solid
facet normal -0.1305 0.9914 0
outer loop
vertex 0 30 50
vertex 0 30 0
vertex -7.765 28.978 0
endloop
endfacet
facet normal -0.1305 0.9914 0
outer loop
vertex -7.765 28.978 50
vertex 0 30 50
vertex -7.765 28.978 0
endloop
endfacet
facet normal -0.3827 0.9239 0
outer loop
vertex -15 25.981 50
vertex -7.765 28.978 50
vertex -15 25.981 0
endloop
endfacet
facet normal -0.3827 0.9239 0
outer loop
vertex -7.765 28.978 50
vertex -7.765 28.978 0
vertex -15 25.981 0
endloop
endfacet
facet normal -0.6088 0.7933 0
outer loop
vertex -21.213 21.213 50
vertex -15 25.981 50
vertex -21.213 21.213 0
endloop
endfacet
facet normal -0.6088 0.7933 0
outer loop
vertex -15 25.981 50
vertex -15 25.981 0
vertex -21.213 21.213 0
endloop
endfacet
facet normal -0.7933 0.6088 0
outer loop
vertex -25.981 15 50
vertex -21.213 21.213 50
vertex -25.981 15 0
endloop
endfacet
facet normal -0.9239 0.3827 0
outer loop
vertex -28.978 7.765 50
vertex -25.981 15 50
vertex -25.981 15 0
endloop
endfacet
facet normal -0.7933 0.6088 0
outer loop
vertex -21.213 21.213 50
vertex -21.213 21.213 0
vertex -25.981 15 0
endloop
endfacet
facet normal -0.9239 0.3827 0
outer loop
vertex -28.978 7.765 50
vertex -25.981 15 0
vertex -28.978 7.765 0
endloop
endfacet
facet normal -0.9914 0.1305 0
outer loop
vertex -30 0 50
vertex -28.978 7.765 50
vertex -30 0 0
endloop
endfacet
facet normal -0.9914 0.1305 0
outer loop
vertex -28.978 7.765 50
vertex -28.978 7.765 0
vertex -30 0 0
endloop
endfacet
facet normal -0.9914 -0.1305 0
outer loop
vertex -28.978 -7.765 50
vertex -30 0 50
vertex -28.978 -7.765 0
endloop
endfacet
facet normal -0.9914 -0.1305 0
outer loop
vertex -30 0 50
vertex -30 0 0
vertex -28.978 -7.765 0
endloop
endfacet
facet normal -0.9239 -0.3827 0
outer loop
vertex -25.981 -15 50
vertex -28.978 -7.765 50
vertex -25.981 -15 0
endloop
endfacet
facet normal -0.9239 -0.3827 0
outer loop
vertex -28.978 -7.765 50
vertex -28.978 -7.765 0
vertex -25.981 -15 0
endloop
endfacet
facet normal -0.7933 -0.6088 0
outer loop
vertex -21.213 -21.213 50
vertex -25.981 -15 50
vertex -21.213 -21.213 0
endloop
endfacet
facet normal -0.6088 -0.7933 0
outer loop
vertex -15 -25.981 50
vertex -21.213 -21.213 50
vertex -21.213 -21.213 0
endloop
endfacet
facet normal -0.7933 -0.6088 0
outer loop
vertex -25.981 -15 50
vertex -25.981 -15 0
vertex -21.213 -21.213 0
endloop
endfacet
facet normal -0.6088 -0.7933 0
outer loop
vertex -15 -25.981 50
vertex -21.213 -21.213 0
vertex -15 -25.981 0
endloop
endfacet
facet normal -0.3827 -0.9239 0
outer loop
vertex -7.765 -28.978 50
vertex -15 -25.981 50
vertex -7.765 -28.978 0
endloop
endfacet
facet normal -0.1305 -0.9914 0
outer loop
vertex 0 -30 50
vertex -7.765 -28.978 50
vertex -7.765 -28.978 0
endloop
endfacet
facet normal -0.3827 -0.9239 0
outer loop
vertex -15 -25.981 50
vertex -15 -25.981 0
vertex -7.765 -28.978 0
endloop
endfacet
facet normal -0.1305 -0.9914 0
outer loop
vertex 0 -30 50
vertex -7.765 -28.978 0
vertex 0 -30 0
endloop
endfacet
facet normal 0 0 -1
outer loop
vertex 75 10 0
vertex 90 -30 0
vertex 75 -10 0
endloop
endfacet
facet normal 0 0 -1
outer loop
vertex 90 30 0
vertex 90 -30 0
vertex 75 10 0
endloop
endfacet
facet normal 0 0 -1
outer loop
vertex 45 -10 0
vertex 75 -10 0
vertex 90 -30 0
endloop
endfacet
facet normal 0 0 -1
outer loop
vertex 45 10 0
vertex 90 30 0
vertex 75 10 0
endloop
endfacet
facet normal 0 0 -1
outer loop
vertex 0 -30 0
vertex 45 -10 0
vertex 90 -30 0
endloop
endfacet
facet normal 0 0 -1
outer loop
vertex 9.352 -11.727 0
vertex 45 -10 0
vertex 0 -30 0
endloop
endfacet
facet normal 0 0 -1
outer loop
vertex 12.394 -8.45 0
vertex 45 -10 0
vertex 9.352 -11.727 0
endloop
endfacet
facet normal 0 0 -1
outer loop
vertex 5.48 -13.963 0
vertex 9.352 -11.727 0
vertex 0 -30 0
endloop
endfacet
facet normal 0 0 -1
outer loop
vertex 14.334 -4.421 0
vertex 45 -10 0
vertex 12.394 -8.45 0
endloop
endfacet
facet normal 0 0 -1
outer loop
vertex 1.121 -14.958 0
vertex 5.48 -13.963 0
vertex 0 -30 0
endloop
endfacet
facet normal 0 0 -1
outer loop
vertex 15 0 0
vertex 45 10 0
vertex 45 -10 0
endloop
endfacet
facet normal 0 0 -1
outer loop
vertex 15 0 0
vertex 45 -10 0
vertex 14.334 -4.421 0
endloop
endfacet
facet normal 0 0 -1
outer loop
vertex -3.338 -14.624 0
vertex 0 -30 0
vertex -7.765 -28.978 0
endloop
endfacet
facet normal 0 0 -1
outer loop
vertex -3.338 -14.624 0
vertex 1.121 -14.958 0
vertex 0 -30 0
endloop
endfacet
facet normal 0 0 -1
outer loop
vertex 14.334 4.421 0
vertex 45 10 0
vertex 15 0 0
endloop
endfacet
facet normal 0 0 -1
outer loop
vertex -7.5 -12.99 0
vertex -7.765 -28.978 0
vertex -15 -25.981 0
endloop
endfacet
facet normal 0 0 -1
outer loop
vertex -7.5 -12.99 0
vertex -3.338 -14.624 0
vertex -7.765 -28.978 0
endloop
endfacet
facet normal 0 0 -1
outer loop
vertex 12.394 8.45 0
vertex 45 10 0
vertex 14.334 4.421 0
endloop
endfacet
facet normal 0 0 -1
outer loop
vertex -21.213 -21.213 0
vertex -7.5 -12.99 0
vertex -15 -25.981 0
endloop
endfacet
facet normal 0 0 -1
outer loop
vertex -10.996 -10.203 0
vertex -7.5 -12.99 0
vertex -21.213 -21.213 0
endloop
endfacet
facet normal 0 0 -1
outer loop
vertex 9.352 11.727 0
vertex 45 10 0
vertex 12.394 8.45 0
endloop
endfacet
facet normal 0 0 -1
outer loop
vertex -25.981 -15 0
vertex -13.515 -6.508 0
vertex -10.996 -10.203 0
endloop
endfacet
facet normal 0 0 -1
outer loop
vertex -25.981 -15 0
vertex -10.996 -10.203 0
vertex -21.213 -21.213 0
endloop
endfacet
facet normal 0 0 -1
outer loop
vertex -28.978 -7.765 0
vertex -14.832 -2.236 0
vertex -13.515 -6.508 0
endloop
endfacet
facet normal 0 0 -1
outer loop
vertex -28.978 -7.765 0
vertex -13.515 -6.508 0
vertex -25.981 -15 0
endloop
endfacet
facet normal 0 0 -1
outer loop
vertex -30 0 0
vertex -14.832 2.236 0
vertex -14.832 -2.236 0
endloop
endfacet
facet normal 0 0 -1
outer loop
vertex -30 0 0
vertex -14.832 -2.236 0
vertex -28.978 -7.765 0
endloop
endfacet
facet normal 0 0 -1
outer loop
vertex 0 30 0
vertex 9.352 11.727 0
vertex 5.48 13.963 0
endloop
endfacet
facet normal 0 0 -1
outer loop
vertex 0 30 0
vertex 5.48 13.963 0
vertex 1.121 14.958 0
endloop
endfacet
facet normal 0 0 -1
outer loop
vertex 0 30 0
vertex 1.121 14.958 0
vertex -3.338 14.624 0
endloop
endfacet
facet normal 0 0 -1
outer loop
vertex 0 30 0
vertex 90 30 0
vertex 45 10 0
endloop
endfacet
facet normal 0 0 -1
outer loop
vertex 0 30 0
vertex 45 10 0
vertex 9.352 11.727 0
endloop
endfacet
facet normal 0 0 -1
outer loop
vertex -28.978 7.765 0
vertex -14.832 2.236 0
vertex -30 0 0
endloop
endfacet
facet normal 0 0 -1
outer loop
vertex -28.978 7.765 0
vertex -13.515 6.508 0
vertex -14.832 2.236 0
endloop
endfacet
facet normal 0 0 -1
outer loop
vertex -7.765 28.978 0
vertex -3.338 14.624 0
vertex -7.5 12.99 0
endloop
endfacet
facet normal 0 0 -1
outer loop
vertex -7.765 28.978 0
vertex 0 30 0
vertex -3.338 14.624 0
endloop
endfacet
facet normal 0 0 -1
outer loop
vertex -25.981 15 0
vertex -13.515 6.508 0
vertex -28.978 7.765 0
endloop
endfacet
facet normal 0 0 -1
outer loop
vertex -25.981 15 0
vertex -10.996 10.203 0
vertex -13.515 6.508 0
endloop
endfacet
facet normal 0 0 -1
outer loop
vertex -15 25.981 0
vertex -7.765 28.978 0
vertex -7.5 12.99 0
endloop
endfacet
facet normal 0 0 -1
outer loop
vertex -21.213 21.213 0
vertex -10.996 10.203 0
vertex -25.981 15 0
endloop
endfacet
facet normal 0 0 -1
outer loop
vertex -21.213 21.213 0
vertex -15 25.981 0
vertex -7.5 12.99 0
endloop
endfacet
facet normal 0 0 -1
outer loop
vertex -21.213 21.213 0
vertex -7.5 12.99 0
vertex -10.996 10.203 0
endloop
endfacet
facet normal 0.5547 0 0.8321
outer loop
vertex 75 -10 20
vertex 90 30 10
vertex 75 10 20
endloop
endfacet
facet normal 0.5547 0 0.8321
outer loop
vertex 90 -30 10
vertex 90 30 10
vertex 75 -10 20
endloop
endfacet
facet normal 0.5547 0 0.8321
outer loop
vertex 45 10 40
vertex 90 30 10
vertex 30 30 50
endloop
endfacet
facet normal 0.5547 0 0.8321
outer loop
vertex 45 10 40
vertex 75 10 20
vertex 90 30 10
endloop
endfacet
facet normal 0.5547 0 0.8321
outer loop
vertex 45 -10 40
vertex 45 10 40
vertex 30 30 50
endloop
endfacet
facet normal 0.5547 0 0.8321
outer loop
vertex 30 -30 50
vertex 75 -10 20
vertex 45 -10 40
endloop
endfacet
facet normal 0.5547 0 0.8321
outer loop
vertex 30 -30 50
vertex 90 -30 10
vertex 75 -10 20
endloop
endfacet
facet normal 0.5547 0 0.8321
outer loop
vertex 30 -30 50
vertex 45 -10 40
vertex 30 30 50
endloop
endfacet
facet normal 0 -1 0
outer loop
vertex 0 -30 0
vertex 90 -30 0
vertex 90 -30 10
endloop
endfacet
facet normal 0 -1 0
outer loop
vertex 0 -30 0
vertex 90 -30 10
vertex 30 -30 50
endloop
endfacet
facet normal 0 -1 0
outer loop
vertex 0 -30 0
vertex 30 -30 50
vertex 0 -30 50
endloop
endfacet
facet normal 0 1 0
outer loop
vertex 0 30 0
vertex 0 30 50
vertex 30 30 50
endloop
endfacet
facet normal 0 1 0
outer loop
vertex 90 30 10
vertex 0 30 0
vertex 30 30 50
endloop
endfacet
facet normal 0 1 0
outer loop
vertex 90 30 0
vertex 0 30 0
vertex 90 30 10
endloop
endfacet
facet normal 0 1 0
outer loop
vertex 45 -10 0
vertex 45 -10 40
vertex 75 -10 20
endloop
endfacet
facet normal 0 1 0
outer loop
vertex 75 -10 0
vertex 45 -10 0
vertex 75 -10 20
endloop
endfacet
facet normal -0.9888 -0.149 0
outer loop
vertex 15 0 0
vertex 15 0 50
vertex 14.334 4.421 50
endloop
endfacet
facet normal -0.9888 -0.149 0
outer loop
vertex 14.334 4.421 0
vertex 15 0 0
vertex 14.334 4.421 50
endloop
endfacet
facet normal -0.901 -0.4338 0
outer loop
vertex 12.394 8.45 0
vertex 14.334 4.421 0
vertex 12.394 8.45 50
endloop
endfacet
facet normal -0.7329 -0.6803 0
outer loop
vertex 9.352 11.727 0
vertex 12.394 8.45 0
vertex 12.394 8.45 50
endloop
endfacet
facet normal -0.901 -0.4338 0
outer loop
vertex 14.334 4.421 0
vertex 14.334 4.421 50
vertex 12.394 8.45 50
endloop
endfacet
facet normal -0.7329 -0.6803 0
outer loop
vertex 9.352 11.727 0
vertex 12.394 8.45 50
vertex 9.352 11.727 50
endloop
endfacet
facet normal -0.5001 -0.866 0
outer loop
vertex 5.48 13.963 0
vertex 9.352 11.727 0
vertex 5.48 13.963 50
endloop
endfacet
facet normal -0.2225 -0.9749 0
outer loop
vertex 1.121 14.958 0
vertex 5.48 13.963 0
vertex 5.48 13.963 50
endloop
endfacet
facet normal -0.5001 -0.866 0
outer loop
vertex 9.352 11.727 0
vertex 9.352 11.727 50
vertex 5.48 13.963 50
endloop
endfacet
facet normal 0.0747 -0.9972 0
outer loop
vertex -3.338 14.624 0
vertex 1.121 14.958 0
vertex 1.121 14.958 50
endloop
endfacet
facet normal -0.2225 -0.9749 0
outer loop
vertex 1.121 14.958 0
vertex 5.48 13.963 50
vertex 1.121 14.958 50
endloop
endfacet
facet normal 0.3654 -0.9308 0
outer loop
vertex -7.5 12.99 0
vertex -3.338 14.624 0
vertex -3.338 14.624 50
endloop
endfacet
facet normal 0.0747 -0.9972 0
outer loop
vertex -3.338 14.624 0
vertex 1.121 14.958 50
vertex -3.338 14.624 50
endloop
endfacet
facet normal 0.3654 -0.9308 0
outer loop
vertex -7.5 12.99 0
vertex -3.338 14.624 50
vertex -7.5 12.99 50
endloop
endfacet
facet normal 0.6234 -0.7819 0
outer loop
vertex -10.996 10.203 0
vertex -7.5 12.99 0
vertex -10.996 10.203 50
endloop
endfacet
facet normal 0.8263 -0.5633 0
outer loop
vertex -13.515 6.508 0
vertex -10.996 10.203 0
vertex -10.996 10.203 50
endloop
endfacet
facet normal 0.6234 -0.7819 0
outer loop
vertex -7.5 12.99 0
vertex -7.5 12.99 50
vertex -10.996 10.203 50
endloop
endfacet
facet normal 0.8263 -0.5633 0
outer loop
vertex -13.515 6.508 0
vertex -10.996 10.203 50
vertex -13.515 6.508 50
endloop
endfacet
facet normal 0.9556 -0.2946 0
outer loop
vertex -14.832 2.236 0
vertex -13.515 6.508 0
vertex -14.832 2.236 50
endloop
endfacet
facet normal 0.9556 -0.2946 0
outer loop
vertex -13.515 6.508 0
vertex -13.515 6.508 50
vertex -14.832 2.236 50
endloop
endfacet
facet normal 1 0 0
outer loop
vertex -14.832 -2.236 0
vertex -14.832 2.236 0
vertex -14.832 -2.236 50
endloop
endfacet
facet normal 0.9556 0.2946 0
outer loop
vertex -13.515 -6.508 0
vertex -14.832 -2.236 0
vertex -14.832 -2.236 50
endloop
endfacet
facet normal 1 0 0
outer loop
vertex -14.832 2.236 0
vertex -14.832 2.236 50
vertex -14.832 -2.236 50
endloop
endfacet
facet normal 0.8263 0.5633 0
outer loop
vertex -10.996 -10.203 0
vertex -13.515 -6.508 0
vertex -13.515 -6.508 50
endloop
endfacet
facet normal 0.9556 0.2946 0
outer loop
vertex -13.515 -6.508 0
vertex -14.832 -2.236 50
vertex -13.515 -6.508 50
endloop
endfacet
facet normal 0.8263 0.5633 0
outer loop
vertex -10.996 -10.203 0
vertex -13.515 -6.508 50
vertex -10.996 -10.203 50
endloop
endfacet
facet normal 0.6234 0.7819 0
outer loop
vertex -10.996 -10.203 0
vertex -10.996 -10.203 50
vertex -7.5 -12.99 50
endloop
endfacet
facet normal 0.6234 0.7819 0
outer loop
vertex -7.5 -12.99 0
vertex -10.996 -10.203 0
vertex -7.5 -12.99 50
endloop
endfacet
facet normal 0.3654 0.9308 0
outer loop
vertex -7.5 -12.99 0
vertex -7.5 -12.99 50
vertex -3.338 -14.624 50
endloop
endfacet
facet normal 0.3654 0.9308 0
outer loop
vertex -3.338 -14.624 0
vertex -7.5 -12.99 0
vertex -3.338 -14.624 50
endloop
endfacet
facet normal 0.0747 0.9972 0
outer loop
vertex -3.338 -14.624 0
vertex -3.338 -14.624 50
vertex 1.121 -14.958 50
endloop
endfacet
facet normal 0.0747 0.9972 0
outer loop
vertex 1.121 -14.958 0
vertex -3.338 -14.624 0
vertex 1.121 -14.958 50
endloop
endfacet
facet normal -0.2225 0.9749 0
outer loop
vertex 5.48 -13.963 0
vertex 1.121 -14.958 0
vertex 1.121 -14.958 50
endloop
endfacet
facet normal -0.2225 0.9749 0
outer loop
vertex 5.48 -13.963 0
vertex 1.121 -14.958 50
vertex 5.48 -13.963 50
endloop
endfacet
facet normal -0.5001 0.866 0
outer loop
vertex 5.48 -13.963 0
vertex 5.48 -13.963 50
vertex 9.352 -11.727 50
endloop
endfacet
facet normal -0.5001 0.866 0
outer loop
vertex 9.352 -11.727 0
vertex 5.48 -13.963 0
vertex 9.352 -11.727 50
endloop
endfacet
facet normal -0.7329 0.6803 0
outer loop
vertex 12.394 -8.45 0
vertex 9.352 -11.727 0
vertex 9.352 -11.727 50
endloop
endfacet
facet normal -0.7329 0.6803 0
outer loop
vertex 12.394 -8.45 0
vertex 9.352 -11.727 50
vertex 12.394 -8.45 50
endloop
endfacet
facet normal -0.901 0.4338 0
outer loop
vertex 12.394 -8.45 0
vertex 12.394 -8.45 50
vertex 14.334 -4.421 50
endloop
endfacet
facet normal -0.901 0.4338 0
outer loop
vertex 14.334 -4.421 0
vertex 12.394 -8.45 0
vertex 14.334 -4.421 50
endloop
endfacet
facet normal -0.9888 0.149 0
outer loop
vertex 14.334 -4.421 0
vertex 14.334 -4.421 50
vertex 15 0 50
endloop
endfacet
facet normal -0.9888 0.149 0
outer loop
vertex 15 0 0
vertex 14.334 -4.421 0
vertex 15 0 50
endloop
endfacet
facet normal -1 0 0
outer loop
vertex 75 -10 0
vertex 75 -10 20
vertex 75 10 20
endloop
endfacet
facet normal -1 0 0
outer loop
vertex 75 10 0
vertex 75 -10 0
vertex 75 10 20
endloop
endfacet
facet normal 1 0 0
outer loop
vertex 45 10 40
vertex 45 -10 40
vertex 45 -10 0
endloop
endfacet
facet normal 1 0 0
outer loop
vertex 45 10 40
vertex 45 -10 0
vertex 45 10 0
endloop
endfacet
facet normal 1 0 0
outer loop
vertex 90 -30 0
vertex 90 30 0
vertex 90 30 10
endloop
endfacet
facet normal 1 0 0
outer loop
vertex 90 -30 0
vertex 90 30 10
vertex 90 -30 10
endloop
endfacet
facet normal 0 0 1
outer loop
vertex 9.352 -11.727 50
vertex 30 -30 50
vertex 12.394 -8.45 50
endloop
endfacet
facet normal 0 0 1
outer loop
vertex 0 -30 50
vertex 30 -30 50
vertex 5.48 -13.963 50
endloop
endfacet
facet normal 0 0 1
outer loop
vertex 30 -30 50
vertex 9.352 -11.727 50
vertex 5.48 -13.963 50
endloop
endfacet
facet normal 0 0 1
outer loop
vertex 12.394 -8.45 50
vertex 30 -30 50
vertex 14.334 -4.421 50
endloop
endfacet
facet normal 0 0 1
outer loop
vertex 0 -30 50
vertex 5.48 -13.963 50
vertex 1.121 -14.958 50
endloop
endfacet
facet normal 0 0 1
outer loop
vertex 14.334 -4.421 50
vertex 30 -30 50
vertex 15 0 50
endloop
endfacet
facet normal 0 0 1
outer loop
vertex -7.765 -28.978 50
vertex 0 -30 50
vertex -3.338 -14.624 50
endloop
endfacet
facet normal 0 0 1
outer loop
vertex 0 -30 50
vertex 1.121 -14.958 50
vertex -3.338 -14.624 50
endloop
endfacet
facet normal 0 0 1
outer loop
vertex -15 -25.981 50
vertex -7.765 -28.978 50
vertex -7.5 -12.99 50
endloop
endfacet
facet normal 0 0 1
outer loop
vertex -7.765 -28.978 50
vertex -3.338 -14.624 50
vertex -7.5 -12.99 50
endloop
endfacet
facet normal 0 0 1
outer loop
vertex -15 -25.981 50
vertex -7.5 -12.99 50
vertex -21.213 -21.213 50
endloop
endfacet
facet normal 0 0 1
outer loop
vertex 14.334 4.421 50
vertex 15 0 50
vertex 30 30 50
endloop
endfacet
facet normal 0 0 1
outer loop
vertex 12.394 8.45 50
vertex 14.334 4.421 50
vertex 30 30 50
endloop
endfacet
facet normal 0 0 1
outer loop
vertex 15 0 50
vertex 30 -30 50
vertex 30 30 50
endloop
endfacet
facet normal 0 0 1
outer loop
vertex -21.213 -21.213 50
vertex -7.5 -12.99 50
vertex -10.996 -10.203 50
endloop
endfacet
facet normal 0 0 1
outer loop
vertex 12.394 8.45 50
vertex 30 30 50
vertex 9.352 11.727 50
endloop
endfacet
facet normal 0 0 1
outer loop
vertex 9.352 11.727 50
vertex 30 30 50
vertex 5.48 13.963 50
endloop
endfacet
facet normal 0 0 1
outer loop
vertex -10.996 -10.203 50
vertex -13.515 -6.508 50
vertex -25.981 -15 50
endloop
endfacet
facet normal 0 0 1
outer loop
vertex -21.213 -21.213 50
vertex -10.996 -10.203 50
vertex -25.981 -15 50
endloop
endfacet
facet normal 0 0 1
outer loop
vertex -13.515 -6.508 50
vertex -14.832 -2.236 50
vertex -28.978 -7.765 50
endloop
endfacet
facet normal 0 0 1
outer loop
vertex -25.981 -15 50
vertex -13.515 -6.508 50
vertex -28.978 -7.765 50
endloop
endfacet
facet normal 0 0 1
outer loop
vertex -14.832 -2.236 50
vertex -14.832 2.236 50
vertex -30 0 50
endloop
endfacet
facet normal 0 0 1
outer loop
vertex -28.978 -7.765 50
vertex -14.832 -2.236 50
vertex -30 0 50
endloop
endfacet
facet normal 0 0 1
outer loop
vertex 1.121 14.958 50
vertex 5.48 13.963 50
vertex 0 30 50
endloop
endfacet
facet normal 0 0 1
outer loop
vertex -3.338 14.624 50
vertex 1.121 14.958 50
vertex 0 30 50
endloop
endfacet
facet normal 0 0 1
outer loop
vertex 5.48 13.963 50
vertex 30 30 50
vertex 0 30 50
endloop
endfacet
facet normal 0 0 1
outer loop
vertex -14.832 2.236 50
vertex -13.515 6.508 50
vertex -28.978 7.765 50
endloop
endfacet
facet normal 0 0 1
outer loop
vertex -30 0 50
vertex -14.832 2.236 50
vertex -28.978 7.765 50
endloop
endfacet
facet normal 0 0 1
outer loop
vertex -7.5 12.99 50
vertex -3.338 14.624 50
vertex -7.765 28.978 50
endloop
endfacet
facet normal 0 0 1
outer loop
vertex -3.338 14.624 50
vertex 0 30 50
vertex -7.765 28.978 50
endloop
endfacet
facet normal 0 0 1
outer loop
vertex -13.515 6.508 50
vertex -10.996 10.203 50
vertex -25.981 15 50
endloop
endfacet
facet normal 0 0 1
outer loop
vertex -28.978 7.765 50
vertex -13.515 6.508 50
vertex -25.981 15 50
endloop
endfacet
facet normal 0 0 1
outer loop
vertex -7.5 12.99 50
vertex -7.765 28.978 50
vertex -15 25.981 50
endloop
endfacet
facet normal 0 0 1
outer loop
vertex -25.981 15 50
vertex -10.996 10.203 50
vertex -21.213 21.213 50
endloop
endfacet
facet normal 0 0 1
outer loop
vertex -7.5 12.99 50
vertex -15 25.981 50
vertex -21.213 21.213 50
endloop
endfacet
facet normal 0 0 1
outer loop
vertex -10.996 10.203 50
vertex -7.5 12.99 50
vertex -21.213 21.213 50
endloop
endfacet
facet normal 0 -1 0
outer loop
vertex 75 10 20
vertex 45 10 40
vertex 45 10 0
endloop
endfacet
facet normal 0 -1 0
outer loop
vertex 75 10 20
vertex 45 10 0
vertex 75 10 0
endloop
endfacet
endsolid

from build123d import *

# Parameters (mm, degrees)
PAD_DEPTH       = 50
SKETCH001_W     = 30
SKETCH001_H     = 20
POCKET_DEPTH    = 50.001
POCKET001_DEPTH = 60.001
SKETCH003_R     = 15
POCKET002_DEPTH = 50.001


with BuildPart() as part:
    # Sketch → Pad (new body)
    with BuildSketch(Plane.XY):
        with BuildLine():
            Line((0, 30), (90, 30))
            Line((90, 30), (90, -30))
            Line((90, -30), (0, -30))
            ThreePointArc((0, 30), (-29.999955, 0), (0, -30))
        make_face()
    extrude(amount=PAD_DEPTH)

    # Sketch001 (on Face6 of Pad) → Pocket (cut, through all)
    with BuildSketch(Plane.XY.offset(50)):
        with Locations((60, 0)):
            Rectangle(SKETCH001_W, SKETCH001_H)
    extrude(amount=-POCKET_DEPTH, mode=Mode.SUBTRACT)

    # Sketch002 (on Face6 of Pocket) → Pocket001 (cut, through all)
    with BuildSketch(Plane.XZ.offset(30)):
        Polygon((30, 50), (90, 50), (90, 10), align=None)
    extrude(amount=-POCKET001_DEPTH, mode=Mode.SUBTRACT)

    # Sketch003 (on Face5 of Pocket001) → Pocket002 (cut, through all)
    with BuildSketch(Plane.XY.offset(50)):
        Circle(SKETCH003_R)
    extrude(amount=-POCKET002_DEPTH, mode=Mode.SUBTRACT)


solid = part.part
